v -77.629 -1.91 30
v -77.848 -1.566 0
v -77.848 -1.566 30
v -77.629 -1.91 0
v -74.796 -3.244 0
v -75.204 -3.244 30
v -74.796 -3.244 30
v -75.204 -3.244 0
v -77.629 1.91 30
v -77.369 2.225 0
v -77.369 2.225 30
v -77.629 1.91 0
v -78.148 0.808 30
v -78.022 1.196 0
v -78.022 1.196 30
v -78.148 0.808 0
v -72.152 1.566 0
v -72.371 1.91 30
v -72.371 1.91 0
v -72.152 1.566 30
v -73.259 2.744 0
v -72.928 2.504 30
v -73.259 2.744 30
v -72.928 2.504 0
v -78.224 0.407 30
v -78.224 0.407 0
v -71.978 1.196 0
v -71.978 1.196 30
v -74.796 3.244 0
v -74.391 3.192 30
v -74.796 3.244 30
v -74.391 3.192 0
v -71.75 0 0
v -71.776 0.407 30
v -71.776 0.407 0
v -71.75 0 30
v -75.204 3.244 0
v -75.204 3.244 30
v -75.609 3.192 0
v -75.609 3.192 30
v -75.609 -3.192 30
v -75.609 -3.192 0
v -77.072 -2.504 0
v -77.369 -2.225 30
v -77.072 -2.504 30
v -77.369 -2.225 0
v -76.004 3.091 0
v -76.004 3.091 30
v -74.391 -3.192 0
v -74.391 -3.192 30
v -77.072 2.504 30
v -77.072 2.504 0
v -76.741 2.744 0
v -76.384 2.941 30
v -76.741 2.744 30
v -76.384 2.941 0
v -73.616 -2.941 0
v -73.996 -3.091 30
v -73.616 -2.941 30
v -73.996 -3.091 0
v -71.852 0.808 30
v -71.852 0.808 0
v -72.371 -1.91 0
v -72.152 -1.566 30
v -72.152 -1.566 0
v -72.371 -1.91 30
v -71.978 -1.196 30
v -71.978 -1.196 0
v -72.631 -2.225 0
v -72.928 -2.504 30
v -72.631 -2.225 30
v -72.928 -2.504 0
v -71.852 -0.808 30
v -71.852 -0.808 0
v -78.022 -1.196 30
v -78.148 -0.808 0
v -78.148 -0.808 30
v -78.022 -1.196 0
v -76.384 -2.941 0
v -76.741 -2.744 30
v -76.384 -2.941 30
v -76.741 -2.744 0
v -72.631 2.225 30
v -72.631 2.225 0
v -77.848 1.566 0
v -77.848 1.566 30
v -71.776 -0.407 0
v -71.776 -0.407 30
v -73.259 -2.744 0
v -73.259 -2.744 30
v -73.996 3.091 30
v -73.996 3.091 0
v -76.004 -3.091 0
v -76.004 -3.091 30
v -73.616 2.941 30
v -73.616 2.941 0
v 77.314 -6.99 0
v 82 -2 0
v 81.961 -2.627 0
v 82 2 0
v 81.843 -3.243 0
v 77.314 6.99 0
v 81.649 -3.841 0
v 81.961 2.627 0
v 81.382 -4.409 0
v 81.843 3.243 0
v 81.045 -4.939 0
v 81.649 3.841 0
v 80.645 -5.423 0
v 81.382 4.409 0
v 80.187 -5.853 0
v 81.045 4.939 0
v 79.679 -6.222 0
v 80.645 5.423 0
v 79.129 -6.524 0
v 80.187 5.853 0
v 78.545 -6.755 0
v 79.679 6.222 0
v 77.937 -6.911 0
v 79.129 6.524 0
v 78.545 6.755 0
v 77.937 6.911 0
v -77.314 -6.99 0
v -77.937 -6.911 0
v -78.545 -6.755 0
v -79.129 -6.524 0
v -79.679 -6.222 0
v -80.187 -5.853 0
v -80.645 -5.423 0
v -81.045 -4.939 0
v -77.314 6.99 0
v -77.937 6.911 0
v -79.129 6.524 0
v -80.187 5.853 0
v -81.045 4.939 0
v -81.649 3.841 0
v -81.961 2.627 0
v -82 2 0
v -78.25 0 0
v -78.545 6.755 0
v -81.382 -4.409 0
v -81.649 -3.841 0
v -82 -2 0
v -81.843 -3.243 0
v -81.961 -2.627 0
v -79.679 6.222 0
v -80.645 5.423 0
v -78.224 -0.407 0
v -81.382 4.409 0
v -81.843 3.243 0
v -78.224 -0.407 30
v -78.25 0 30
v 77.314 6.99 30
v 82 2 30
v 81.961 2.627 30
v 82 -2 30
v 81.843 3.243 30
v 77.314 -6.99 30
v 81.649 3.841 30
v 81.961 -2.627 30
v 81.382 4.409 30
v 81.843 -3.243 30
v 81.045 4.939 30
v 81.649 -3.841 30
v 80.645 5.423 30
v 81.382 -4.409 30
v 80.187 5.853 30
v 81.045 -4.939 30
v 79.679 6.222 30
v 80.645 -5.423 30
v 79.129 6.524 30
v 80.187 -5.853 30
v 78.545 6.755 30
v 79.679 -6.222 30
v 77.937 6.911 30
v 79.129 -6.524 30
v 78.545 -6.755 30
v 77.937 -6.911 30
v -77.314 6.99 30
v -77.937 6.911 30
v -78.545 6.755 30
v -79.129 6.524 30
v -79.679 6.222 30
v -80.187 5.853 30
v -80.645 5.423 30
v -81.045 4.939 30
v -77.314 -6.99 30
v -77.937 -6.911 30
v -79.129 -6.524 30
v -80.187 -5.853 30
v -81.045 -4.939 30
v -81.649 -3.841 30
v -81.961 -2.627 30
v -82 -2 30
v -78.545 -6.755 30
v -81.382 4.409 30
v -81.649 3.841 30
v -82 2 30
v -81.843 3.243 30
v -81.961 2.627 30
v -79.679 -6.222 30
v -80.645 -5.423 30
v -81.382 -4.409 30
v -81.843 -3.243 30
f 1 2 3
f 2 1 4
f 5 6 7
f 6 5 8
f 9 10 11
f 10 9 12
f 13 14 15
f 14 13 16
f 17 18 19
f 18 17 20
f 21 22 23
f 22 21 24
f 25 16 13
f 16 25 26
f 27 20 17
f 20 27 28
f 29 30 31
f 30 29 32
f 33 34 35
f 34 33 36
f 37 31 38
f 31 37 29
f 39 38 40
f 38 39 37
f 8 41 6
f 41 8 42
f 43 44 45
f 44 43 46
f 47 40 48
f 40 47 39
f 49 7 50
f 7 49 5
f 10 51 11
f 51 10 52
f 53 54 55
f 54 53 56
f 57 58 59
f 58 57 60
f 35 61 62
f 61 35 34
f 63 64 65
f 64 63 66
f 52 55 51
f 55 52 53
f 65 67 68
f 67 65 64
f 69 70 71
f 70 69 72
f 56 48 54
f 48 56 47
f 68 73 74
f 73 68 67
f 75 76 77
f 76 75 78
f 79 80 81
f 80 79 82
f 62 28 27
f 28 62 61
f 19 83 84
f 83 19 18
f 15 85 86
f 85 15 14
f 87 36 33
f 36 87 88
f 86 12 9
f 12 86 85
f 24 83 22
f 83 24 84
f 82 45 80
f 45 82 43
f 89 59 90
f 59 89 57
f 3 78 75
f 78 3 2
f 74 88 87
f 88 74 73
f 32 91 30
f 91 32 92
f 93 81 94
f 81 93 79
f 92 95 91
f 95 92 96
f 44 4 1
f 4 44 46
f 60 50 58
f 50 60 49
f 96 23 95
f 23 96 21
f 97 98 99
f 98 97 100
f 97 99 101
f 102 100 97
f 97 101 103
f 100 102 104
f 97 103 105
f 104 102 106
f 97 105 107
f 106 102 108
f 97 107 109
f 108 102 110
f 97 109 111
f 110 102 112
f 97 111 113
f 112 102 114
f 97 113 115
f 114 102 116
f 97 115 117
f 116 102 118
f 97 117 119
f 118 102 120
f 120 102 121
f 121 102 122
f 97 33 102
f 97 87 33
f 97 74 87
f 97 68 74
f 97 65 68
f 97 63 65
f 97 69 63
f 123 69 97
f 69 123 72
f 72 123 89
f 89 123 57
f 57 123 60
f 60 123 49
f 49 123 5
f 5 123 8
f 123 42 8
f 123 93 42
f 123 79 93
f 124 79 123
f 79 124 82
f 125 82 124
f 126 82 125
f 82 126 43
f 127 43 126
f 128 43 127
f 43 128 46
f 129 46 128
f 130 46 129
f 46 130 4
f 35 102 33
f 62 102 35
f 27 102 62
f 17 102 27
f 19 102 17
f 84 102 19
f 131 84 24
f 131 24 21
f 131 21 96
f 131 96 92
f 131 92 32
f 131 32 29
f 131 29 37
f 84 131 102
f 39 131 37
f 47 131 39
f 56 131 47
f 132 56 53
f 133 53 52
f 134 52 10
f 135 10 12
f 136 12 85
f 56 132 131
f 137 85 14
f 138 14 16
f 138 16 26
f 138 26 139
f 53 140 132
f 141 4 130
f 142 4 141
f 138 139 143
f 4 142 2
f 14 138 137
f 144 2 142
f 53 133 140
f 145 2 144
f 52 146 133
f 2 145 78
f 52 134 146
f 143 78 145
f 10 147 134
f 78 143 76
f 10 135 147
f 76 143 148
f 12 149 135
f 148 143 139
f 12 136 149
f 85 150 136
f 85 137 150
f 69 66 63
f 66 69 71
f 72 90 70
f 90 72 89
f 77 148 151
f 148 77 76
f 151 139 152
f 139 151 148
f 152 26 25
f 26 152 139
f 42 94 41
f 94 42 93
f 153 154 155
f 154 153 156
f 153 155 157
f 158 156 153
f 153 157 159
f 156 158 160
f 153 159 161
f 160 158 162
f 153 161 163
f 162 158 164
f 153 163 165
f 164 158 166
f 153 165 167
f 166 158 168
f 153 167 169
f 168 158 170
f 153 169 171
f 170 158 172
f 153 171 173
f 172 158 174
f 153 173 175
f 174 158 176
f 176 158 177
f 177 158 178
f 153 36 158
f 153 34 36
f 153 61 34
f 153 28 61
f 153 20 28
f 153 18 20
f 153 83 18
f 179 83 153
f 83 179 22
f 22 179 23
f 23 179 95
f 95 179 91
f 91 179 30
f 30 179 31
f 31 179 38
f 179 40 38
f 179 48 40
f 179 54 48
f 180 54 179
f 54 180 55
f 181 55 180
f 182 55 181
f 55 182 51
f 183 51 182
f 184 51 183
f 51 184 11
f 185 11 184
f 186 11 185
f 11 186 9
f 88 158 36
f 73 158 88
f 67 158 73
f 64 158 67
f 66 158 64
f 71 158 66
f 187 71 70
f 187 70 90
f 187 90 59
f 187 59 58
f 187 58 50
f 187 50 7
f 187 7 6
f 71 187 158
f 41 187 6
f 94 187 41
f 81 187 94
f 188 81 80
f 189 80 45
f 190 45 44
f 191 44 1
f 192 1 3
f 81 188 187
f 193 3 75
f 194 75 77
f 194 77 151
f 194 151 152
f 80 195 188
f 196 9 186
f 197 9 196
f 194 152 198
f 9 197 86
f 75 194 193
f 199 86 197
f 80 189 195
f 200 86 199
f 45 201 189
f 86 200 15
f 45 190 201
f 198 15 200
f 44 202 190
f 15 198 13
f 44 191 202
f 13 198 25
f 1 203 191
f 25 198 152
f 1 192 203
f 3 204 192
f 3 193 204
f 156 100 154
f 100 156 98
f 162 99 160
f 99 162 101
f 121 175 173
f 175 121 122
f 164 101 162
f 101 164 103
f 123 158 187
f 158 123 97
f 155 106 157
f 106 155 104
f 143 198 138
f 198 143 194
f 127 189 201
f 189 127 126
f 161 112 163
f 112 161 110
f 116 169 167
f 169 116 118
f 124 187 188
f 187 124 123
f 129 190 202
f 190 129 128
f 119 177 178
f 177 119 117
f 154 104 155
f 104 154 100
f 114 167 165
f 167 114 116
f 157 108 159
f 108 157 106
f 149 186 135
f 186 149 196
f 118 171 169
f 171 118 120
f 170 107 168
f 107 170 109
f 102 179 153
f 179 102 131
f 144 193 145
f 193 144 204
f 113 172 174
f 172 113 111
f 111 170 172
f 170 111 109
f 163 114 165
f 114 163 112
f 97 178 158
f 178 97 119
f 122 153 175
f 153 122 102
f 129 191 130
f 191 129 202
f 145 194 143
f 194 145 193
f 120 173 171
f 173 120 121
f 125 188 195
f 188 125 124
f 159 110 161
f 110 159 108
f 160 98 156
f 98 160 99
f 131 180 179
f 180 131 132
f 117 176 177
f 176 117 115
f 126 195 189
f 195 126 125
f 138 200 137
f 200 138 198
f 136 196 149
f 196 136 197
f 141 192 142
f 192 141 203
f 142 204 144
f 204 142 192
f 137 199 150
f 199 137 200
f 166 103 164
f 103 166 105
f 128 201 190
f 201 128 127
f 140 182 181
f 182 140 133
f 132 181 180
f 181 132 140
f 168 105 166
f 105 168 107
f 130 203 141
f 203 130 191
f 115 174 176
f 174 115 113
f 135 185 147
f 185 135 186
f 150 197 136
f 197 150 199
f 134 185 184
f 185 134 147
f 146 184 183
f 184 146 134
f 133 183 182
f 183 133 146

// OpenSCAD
$fn = 50;


difference() {
	union() {
		hull() {
			translate(v = [-77.0000000000, 2.0000000000, 0]) {
				cylinder(h = 30, r = 5);
			}
			translate(v = [77.0000000000, 2.0000000000, 0]) {
				cylinder(h = 30, r = 5);
			}
			translate(v = [-77.0000000000, -2.0000000000, 0]) {
				cylinder(h = 30, r = 5);
			}
			translate(v = [77.0000000000, -2.0000000000, 0]) {
				cylinder(h = 30, r = 5);
			}
		}
	}
	union() {
		translate(v = [-75.0000000000, 0.0000000000, 0]) {
			cylinder(h = 30, r = 3.2500000000);
		}
		translate(v = [-75.0000000000, 0.0000000000, 0]) {
			cylinder(h = 30, r = 1.8000000000);
		}
		translate(v = [-75.0000000000, 0.0000000000, 0]) {
			cylinder(h = 30, r = 1.8000000000);
		}
		translate(v = [-75.0000000000, 0.0000000000, 0]) {
			cylinder(h = 30, r = 1.8000000000);
		}
	}
}
